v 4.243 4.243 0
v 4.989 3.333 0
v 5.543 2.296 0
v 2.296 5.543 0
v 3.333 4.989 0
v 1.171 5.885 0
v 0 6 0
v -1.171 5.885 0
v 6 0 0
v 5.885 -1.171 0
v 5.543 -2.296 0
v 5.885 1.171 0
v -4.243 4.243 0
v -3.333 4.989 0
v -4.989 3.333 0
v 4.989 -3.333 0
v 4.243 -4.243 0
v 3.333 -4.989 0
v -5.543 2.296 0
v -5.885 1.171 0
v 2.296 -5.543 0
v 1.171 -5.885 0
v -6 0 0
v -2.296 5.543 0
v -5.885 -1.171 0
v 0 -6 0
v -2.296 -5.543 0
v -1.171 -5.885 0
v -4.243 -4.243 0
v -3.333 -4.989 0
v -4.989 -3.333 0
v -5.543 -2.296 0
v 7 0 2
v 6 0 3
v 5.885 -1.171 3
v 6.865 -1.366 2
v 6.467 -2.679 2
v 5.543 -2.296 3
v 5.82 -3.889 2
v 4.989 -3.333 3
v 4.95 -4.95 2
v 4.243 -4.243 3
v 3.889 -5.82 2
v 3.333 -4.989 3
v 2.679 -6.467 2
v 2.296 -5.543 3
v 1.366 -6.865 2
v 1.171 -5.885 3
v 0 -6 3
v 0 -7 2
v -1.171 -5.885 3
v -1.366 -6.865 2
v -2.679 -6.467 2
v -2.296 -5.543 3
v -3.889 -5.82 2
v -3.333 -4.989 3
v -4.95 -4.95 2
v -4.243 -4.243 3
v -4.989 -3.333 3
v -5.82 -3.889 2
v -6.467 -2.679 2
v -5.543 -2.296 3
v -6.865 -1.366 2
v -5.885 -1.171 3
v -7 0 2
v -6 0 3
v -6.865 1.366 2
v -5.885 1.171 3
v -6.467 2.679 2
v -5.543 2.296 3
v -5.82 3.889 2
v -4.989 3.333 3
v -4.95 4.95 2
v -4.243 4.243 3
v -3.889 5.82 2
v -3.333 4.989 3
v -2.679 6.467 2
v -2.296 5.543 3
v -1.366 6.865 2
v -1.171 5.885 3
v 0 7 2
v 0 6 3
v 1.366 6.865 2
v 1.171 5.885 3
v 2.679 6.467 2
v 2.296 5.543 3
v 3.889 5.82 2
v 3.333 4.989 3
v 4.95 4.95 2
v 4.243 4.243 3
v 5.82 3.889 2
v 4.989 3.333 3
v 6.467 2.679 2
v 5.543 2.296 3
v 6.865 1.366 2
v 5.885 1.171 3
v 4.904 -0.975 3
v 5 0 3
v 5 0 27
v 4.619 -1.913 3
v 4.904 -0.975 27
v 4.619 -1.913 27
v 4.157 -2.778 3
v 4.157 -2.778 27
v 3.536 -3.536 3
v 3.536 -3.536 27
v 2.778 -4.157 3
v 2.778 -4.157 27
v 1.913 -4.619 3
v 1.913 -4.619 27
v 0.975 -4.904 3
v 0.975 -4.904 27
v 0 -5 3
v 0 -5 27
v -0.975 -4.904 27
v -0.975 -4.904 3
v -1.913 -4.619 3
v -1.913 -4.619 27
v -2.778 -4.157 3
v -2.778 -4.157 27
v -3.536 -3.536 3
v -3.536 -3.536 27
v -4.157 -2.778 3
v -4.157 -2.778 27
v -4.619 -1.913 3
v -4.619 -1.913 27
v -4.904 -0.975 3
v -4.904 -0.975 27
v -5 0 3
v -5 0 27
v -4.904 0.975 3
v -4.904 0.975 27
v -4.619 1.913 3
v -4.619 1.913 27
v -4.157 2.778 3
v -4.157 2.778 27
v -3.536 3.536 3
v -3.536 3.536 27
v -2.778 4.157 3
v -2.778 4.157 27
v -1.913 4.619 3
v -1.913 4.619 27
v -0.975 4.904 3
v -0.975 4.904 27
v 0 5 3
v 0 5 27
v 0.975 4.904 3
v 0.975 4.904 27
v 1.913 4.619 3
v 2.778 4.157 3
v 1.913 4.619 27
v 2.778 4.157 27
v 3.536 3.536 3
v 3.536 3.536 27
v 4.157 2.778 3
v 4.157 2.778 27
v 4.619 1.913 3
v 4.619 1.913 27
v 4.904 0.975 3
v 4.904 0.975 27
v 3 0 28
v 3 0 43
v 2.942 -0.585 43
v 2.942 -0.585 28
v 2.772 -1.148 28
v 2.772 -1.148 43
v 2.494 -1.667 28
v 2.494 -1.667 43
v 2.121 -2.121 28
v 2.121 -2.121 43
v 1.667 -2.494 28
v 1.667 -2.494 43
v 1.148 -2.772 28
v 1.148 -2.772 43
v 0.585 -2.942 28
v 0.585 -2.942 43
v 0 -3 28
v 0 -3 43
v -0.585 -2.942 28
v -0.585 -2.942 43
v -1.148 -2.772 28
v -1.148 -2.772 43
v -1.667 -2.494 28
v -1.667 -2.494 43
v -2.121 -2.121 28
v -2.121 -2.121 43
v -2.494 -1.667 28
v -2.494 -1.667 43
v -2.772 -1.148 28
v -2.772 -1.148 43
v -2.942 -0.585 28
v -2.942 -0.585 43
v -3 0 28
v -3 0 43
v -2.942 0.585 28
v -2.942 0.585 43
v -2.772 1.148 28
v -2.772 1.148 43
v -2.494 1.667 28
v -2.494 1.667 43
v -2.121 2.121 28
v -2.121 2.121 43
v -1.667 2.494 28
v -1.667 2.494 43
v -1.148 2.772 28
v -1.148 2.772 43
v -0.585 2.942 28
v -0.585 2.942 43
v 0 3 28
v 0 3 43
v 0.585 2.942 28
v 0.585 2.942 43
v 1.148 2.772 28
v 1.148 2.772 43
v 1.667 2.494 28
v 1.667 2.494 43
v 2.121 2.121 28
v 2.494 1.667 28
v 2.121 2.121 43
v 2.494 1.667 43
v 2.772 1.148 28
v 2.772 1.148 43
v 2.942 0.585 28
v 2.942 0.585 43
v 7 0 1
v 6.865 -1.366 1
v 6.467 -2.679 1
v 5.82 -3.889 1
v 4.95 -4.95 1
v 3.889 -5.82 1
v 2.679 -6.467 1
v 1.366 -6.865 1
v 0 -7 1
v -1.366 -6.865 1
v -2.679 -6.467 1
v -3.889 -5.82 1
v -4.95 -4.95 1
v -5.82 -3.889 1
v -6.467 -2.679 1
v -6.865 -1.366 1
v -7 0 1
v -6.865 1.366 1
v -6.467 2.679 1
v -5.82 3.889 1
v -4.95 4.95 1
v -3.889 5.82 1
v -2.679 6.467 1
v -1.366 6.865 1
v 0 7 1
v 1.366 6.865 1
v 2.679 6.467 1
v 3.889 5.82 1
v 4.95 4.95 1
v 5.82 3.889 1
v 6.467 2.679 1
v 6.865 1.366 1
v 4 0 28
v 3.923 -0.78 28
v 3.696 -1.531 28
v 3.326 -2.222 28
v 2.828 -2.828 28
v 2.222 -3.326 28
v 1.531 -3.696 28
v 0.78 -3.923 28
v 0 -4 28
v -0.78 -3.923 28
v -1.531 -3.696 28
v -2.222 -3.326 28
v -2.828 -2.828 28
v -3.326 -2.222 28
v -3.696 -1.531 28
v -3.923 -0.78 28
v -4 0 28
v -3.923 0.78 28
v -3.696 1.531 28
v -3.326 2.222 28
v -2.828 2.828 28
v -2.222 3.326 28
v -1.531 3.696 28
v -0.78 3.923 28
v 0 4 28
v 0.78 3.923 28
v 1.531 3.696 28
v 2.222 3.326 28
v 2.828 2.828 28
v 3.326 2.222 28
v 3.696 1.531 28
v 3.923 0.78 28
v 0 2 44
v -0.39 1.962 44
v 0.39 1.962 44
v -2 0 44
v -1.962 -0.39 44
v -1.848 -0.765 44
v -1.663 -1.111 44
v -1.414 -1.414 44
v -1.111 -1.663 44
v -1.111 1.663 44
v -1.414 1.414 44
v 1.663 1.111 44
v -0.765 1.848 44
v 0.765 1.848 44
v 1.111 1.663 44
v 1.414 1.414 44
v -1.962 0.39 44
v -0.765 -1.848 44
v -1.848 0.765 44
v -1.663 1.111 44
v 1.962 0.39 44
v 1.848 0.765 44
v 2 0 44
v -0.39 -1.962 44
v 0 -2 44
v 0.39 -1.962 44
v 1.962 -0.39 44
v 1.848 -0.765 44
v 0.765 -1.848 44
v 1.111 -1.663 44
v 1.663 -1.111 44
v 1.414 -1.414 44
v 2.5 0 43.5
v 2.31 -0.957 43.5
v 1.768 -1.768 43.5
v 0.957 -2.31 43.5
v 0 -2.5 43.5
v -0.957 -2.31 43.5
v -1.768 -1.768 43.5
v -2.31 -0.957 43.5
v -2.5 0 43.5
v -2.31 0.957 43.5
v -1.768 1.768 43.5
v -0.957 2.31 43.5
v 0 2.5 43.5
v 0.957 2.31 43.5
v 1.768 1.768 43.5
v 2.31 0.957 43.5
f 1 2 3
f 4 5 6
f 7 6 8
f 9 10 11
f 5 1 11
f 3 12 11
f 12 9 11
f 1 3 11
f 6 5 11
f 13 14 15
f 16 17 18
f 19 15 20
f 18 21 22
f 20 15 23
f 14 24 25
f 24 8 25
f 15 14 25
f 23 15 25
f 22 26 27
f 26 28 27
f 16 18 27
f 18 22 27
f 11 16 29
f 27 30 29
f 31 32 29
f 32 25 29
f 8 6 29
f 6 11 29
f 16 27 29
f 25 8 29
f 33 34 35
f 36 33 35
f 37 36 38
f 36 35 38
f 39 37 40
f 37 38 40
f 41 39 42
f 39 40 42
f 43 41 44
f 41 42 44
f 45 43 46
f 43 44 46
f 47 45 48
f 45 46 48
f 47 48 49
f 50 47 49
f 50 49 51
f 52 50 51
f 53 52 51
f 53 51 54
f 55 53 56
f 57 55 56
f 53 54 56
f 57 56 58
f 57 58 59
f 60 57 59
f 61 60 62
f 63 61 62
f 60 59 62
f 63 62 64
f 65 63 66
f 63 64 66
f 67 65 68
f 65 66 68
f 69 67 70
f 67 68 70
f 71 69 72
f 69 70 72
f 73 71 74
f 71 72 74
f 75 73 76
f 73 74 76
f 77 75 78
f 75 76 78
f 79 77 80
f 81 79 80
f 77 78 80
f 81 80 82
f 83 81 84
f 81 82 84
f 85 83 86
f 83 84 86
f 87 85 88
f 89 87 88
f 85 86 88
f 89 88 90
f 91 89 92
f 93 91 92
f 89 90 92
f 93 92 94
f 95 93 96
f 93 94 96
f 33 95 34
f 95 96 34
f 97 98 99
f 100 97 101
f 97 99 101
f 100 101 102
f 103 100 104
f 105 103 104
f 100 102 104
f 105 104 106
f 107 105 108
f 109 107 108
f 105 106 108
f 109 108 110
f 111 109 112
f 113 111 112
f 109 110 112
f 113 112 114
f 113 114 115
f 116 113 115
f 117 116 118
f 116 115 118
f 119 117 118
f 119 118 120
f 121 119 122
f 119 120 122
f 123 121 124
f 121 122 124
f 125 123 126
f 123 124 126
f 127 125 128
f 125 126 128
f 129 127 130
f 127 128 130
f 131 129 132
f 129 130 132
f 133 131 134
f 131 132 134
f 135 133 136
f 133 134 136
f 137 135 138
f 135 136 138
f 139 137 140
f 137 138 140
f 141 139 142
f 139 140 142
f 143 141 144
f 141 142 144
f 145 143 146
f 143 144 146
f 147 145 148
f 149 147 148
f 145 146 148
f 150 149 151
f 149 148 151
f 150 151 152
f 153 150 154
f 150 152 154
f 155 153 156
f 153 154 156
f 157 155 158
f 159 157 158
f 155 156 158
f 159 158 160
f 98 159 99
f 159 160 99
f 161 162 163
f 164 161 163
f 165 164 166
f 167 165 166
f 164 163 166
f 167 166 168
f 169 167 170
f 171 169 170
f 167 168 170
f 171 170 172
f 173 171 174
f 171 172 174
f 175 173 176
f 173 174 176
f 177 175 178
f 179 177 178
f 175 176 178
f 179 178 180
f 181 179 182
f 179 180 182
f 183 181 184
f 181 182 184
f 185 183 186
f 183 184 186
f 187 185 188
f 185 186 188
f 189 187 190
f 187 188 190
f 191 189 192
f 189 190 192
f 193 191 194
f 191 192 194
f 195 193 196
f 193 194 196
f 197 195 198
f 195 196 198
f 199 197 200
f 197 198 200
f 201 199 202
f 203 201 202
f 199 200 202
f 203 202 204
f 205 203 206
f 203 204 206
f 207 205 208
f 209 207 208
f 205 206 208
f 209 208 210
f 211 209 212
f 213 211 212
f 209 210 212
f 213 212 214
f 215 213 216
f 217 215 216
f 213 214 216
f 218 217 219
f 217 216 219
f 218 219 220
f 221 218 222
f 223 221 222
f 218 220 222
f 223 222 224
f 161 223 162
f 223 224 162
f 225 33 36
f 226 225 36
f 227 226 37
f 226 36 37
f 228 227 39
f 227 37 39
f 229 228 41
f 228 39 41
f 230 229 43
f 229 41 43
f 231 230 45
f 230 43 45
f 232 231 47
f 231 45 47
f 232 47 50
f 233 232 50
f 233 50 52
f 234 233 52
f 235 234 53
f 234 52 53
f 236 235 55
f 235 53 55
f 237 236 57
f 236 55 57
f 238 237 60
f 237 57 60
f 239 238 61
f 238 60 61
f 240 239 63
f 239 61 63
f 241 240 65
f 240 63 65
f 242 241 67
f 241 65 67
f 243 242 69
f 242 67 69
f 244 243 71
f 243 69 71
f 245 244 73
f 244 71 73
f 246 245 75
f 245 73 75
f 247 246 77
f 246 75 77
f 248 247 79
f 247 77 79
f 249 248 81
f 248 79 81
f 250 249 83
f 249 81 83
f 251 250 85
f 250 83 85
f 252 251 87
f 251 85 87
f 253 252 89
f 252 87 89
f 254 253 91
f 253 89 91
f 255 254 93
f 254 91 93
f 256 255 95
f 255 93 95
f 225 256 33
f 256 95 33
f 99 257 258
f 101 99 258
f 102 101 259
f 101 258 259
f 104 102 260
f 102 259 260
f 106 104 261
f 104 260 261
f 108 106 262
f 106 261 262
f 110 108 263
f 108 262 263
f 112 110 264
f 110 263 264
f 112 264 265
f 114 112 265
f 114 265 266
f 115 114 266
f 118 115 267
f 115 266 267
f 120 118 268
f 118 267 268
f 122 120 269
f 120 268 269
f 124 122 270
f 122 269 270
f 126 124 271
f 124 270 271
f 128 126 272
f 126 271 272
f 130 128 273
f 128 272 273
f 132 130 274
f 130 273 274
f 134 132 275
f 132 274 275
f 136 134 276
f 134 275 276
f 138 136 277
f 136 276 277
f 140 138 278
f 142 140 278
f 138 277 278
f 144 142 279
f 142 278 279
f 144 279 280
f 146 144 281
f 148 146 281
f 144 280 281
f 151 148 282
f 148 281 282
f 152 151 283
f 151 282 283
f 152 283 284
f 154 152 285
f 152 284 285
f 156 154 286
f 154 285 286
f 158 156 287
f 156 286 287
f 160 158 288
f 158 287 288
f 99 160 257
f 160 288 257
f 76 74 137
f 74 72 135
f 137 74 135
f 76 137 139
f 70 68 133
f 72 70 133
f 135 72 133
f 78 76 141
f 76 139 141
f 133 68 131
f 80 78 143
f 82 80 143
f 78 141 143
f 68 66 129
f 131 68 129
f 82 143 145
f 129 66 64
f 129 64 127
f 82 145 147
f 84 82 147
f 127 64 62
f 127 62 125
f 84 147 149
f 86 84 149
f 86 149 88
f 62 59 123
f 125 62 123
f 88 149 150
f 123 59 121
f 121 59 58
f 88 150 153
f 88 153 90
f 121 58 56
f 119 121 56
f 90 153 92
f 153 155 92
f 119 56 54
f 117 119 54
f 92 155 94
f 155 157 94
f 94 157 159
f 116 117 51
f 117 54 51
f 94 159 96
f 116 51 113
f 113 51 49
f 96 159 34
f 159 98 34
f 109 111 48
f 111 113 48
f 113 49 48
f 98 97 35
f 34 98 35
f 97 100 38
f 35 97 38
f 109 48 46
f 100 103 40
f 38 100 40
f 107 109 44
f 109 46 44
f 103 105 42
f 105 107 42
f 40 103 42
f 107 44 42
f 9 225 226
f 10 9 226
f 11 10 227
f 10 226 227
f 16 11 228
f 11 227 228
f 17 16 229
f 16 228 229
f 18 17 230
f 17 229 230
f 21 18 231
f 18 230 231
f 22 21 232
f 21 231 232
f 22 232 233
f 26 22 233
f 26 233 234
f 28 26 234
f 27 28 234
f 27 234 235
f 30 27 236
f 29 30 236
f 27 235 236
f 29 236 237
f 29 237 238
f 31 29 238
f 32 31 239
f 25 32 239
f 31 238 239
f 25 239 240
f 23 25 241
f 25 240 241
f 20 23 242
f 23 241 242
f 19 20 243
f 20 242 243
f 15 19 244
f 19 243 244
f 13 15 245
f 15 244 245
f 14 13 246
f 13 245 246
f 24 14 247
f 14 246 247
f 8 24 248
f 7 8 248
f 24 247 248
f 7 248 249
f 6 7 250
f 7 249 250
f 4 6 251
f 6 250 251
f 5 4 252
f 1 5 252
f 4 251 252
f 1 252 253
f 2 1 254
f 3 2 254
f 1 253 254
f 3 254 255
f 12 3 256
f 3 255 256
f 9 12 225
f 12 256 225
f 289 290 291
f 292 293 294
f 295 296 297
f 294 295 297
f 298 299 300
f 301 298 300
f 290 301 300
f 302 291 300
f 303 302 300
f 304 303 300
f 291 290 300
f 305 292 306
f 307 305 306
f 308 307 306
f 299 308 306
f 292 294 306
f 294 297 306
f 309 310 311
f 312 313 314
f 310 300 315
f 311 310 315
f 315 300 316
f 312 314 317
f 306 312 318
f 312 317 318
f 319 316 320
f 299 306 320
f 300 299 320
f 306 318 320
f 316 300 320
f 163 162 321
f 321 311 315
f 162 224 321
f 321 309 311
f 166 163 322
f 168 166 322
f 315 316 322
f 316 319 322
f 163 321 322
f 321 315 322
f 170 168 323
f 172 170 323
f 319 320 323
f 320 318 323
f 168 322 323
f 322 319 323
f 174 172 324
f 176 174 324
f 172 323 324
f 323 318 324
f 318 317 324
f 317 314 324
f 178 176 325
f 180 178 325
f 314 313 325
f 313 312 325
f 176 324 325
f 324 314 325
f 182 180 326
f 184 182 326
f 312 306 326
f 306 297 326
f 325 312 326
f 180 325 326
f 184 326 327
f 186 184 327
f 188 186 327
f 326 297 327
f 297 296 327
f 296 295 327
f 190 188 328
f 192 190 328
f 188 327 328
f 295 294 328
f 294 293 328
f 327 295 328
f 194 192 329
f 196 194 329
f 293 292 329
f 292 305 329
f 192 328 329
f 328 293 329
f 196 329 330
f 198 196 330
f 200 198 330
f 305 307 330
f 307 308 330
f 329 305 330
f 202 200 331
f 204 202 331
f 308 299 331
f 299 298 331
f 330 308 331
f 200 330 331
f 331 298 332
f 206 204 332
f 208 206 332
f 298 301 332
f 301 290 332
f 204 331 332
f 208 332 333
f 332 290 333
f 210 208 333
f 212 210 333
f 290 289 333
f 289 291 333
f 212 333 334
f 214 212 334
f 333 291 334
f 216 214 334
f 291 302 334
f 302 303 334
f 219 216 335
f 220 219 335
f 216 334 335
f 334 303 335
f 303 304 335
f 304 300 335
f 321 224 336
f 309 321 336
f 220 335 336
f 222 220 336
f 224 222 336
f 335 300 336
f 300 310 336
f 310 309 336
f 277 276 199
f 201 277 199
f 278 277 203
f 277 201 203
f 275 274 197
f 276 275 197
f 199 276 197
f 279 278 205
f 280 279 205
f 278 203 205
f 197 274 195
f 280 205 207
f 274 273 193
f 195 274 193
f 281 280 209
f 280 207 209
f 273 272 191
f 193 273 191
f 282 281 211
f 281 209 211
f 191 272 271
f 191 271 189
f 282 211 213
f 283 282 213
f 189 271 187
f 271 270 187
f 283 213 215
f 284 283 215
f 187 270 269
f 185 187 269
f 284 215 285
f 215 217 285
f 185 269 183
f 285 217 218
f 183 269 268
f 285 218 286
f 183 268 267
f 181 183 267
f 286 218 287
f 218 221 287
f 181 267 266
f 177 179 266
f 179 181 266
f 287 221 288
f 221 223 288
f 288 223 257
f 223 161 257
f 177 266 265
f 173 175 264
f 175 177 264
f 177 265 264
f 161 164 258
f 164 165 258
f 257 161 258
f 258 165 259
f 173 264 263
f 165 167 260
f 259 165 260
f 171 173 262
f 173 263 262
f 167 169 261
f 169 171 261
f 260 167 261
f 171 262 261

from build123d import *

# Parameters (mm, degrees)
CHAMFER1_SIZE = 1


with BuildPart() as part:
    # Sketch1 → Revolve1 (revolve)
    with BuildSketch(Plane(origin=(0, 0, 0), x_dir=(1, 0, 0), z_dir=(0, 1, 0))):
        Polygon((0, 0), (7, 0), (7, -3), (5, -3), (5, -28), (3, -28), (3, -44), (0, -44), align=None)
    revolve(axis=Axis((0, 0, 44), (0, 0, -1)))

    # Chamfer1
    chamfer1_edges = [part.edges().sort_by_distance(p)[0] for p in [
        (-3, 0, 44),
        (-5, 0, 28),
        (-7, 0, 3),
        (-7, 0, 0),
    ]]
    chamfer(chamfer1_edges, length=CHAMFER1_SIZE)


solid = part.part
